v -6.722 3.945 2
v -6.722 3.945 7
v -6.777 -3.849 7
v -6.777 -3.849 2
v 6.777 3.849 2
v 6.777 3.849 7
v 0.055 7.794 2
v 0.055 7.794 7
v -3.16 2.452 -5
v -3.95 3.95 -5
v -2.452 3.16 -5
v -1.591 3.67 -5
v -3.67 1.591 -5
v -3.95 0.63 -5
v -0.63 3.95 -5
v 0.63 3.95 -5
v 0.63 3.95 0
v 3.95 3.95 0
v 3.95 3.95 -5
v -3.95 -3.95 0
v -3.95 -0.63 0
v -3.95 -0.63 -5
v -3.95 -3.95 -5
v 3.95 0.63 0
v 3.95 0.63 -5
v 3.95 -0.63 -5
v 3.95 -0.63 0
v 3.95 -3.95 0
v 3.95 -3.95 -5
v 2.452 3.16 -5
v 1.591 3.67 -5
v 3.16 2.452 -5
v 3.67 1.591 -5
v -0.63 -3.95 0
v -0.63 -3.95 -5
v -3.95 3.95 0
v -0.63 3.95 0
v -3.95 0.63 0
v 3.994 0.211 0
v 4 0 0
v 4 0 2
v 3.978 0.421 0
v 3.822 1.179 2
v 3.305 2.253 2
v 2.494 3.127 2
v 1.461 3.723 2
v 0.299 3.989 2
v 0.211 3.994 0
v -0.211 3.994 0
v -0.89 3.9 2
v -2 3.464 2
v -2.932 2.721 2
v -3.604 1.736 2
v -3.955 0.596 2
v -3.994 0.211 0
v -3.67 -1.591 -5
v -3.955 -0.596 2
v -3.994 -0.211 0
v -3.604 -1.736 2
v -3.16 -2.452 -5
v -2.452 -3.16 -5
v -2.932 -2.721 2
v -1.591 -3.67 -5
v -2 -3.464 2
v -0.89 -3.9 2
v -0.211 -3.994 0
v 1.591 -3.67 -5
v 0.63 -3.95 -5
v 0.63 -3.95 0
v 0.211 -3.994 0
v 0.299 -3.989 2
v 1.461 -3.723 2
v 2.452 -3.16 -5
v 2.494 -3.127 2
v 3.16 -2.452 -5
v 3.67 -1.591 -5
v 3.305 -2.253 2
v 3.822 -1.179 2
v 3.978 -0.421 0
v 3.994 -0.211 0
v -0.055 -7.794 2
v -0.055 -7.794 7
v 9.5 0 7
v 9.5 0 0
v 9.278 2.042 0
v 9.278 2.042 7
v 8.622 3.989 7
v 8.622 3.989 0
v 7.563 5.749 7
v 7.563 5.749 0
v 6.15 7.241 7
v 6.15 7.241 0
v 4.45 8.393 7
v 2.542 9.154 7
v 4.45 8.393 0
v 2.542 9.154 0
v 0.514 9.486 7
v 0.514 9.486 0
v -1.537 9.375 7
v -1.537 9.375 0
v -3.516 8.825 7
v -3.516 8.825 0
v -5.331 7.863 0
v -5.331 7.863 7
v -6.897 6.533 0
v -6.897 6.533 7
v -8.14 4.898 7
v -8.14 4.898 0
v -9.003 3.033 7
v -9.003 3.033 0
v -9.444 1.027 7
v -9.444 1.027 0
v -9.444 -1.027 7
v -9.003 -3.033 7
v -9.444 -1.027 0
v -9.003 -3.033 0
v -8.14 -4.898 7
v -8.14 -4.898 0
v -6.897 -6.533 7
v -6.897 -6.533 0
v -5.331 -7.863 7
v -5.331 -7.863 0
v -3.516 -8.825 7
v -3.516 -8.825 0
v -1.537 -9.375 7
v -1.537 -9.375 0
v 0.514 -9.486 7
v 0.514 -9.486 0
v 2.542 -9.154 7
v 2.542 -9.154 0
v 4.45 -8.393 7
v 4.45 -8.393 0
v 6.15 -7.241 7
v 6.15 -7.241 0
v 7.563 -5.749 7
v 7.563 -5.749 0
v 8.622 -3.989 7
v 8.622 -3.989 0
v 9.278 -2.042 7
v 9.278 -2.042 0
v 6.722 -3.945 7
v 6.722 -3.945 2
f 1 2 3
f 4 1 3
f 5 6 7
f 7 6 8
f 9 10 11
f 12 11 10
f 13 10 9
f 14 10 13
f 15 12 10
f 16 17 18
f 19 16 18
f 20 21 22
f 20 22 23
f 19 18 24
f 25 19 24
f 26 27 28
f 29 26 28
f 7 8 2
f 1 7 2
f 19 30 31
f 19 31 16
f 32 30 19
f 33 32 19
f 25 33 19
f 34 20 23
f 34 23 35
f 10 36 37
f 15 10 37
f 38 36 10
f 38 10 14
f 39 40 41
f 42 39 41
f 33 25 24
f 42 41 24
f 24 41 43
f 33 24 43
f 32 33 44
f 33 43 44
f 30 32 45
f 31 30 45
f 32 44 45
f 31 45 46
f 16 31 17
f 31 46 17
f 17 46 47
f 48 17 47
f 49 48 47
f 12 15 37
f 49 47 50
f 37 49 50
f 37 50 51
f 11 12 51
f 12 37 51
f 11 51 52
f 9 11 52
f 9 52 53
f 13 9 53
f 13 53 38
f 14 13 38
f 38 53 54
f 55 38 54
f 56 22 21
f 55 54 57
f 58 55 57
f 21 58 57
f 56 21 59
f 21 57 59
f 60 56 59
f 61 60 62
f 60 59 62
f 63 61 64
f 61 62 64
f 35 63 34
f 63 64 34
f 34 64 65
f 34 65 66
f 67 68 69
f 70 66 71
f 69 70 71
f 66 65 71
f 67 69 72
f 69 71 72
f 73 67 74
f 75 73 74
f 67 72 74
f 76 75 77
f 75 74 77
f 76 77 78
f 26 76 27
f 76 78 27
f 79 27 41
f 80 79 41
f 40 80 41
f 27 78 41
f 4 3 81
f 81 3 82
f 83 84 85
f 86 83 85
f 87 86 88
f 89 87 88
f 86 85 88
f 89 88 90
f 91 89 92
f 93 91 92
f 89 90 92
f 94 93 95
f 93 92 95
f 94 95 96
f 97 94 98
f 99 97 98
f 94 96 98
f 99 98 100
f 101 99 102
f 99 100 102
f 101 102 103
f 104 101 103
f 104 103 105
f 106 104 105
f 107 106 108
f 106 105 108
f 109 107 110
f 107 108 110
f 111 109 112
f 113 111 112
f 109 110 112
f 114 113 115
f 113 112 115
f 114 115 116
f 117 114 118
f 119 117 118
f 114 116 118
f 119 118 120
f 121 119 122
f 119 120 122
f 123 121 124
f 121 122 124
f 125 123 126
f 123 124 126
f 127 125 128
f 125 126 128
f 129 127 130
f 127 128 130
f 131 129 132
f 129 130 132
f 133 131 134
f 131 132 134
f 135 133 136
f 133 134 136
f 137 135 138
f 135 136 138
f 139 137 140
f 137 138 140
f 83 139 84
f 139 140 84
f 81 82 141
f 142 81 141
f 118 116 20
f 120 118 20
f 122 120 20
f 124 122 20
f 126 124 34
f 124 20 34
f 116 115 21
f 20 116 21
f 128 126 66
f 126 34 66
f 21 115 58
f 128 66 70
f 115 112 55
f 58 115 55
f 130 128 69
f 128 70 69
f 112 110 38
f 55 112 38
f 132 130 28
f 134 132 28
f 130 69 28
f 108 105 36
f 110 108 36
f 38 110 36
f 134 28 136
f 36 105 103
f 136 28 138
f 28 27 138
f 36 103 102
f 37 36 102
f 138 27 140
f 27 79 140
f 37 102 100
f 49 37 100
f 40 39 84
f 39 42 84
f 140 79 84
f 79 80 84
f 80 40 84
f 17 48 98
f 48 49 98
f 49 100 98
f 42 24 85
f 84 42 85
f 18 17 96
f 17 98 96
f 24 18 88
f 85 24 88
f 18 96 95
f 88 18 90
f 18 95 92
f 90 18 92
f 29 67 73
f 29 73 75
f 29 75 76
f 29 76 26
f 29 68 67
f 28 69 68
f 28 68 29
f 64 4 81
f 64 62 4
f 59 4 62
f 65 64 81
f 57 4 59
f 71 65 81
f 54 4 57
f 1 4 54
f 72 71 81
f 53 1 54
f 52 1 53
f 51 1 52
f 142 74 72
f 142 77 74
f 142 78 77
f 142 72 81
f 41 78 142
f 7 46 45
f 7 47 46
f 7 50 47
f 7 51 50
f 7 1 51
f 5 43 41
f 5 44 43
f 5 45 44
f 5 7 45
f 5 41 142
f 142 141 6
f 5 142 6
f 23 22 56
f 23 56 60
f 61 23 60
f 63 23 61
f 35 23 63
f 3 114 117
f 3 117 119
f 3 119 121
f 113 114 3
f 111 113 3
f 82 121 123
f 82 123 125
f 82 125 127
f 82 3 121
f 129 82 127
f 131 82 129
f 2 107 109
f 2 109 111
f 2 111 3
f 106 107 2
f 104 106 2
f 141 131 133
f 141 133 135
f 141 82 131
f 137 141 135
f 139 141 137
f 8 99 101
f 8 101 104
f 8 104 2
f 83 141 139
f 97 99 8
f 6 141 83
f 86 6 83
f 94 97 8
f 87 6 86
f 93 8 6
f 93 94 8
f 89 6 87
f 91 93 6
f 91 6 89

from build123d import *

# Parameters (mm, degrees)
F0_R     = 9.5
F1_DEPTH = 7
F3_DEPTH = 5
F4_W     = 7.9
F4_H     = 7.9
F5_DEPTH = 5
F6_R     = 4
F7_DEPTH = 7.001


with BuildPart() as f1:
    # F0 (on Top) → F1 (new body)
    with BuildSketch(Plane.XY):
        Circle(F0_R)
    extrude(amount=F1_DEPTH)

    # F2 (on face) → F3 (cut)
    with BuildSketch(Plane.XY.offset(7)):
        Polygon((-0.054944, -7.794035), (6.72236, -3.944601), (6.777304, 3.849434), (0.054944, 7.794035), (-6.72236, 3.944601), (-6.777304, -3.849434), align=None)
    extrude(amount=-F3_DEPTH, mode=Mode.SUBTRACT)

    # F4 (on face) → F5 (join)
    with BuildSketch(Plane(origin=(0, 0, 0), x_dir=(1, 0, 0), z_dir=(0, 0, -1))):
        Rectangle(F4_W, F4_H)
    extrude(amount=F5_DEPTH)

    # F6 (on face) → F7 (cut, through all)
    with BuildSketch(Plane.XY.offset(2)):
        Circle(F6_R)
    extrude(amount=-F7_DEPTH, mode=Mode.SUBTRACT)


solid = f1.part
